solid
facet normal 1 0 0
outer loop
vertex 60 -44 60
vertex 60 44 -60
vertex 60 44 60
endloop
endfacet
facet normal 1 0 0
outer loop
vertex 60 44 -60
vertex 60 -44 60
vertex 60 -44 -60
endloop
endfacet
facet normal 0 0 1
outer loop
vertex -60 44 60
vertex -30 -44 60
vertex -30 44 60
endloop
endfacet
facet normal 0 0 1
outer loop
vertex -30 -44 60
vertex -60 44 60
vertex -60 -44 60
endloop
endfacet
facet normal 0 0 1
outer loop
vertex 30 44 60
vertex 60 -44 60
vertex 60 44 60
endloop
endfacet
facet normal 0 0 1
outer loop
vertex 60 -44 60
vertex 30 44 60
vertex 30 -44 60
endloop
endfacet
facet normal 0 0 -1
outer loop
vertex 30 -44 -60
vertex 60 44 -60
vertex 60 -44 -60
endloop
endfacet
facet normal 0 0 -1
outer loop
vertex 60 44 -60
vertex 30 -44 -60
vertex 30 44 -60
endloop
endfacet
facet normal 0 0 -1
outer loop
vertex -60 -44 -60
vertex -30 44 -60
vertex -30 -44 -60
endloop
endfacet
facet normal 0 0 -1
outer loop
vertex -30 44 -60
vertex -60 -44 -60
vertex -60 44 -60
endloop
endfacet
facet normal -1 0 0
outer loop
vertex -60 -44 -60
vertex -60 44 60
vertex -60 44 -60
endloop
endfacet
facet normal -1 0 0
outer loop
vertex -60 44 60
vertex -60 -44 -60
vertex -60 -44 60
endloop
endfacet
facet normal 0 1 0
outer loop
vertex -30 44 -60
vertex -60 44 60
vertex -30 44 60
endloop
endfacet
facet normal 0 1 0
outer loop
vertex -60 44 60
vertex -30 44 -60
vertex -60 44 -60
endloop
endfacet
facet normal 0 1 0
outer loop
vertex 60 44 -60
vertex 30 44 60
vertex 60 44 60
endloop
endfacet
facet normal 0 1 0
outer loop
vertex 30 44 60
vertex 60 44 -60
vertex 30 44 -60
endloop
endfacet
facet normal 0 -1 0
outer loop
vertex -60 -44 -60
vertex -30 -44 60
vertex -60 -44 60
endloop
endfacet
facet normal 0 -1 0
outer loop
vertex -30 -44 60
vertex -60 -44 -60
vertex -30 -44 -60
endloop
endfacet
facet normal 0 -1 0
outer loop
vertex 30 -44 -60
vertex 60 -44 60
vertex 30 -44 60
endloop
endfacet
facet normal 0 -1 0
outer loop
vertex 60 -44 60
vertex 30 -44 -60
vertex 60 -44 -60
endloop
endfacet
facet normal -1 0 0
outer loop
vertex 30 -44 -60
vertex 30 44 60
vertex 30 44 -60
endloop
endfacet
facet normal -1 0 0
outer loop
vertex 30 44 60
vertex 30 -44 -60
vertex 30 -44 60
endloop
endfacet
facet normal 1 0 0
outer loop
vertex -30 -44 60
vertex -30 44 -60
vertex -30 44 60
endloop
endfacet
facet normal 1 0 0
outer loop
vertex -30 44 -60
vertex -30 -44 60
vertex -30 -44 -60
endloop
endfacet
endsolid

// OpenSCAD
module mains_transformer() {
    difference() {
        // Main body of the transformer
        cube([120, 88, 120], center=true);
        
        // Cutout for the core
        translate([-30, -44, -60])
            cube([60, 88, 120], center=false);
    }
}

mains_transformer();
